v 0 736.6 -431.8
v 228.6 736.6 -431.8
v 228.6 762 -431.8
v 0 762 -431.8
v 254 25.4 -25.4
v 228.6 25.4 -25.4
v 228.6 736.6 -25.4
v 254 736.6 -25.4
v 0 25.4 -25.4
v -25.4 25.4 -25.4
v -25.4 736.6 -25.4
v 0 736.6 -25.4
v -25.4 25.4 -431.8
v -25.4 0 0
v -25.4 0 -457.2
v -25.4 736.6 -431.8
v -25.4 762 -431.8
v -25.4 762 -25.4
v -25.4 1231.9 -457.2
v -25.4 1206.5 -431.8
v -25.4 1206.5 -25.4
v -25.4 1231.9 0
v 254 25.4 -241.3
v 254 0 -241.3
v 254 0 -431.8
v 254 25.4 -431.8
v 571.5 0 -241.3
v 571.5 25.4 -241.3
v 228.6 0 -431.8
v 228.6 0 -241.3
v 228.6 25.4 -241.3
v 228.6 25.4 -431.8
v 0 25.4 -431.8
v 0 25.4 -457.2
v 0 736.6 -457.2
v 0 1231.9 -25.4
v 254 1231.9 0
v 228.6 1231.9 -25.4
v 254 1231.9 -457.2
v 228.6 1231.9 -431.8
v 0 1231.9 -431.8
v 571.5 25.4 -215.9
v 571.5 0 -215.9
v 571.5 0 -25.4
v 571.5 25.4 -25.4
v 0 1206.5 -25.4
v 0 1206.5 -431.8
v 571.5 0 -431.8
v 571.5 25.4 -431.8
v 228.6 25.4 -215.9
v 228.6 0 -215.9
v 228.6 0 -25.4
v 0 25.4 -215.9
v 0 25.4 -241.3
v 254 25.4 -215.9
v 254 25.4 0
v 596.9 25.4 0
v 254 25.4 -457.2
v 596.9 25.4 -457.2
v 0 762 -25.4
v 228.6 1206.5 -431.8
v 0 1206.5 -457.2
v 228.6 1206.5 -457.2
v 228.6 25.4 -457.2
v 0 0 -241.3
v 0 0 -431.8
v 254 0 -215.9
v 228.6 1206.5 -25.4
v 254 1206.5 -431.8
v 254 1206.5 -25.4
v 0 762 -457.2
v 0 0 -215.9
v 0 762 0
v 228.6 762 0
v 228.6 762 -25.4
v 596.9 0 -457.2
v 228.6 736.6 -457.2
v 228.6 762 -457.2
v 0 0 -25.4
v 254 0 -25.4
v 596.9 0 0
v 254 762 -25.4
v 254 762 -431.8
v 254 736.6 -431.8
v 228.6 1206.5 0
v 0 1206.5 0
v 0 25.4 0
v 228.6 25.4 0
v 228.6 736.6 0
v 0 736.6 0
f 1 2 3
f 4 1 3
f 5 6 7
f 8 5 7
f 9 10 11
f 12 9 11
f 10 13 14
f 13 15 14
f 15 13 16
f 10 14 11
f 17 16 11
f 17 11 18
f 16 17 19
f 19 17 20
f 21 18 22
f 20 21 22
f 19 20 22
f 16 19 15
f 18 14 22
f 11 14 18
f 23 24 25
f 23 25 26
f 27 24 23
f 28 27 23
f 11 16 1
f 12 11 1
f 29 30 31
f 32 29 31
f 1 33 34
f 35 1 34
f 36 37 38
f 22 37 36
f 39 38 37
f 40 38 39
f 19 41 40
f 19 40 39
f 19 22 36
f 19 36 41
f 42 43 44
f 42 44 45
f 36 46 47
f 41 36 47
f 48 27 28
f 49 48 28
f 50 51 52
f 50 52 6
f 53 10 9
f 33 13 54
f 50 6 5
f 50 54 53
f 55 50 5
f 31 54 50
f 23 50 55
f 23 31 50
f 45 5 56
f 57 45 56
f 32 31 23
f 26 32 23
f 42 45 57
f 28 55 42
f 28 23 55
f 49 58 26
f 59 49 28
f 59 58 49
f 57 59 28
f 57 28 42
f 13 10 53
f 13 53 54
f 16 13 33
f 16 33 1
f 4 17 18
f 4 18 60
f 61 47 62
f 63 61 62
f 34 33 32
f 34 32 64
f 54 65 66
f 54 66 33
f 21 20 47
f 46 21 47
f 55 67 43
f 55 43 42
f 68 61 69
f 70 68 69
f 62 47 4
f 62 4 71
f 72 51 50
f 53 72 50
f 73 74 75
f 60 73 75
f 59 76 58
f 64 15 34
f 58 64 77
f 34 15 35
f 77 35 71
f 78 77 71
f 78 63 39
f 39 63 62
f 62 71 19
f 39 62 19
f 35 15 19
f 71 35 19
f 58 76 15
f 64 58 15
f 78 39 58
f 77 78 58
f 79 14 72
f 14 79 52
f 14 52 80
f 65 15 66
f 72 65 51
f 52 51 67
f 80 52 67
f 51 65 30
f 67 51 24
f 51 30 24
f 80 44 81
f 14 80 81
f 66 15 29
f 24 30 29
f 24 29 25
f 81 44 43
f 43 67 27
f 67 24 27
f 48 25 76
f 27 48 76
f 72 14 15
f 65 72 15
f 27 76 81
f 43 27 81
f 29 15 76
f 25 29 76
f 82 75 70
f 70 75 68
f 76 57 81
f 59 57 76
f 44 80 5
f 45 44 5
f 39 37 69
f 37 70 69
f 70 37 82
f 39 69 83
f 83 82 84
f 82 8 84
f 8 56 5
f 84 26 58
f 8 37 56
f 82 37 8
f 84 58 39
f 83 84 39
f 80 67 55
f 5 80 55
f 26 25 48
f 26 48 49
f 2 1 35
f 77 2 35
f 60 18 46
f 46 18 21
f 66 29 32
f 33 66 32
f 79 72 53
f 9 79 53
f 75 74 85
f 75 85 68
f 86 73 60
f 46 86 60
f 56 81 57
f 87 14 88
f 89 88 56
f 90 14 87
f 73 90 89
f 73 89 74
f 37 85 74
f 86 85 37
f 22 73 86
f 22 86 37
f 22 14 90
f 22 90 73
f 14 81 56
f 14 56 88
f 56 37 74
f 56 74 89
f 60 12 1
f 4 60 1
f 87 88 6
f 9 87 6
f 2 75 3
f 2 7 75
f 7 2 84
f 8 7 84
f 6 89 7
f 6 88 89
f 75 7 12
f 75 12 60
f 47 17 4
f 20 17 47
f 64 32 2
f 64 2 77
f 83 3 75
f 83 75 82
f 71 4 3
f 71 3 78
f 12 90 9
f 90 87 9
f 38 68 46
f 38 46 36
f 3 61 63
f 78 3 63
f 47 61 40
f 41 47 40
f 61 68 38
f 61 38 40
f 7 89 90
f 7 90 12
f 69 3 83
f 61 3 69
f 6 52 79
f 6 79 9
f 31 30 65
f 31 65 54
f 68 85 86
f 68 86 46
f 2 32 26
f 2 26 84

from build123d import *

# Parameters (mm, degrees)
SKETCH1_W             = 25.4
SKETCH1_H             = 25.4
BOSS_EXTRUDE1_DEPTH   = 1231.9
BOSS_EXTRUDE1_2_DEPTH = 1231.9
BOSS_EXTRUDE1_3_DEPTH = 1231.9
BOSS_EXTRUDE1_4_DEPTH = 1231.9
SKETCH2_W             = 25.4
SKETCH2_H             = 25.4
BOSS_EXTRUDE2_DEPTH   = 596.9
SKETCH3_W             = 25.4
SKETCH3_H             = 25.4
BOSS_EXTRUDE3_DEPTH   = 406.4
SKETCH4_W             = 25.4
SKETCH4_H             = 25.4
BOSS_EXTRUDE4_DEPTH   = 406.4
BOSS_EXTRUDE5_REACH   = 1445.225
SKETCH5_W             = 25.4
SKETCH5_H             = 25.4


with BuildPart() as part:
    # Sketch1 → Boss-Extrude1 (new body)
    with BuildSketch(Plane(origin=(0, 0, 0), x_dir=(1, 0, 0), z_dir=(0, 1, 0))):
        with Locations((-12.7, 12.7)):
            Rectangle(SKETCH1_W, SKETCH1_H)
    extrude(amount=BOSS_EXTRUDE1_DEPTH)



with BuildPart() as body_2:
    # Sketch1 → Boss-Extrude1 2 (new body)
    with BuildSketch(Plane(origin=(0, 0, 0), x_dir=(1, 0, 0), z_dir=(0, 1, 0))):
        with Locations((-12.7, 444.5)):
            Rectangle(SKETCH1_W, SKETCH1_H)
    extrude(amount=BOSS_EXTRUDE1_2_DEPTH)


with BuildPart() as body_3:
    # Sketch1 → Boss-Extrude1 3 (new body)
    with BuildSketch(Plane(origin=(0, 0, 0), x_dir=(1, 0, 0), z_dir=(0, 1, 0))):
        with Locations((241.3, 12.7)):
            Rectangle(SKETCH1_W, SKETCH1_H)
    extrude(amount=BOSS_EXTRUDE1_3_DEPTH)


with BuildPart() as body_4:
    # Sketch1 → Boss-Extrude1 4 (new body)
    with BuildSketch(Plane(origin=(0, 0, 0), x_dir=(1, 0, 0), z_dir=(0, 1, 0))):
        with Locations((241.3, 444.5)):
            Rectangle(SKETCH1_W, SKETCH1_H)
    extrude(amount=BOSS_EXTRUDE1_4_DEPTH)


with BuildPart() as part_1:
    add(part.part)

    add(body_2.part)  # Boss-Extrude2 merges body 2

    add(body_3.part)  # Boss-Extrude2 merges body 3

    add(body_4.part)  # Boss-Extrude2 merges body 4
    # Sketch2 → Boss-Extrude2 (add)
    with BuildSketch(Plane(origin=(0, 0, 0), x_dir=(0, 0, -1), z_dir=(1, 0, 0))):
        with Locations((12.7, 12.7)):
            Rectangle(SKETCH2_W, SKETCH2_H)
        with Locations((444.5, 12.7)):
            Rectangle(SKETCH2_W, SKETCH2_H)
        with Locations((228.6, 12.7)):
            Rectangle(SKETCH2_W, SKETCH2_H)
    extrude(amount=BOSS_EXTRUDE2_DEPTH)

    # Sketch3 → Boss-Extrude3 (add)
    with BuildSketch(Plane(origin=(0, 0, -25.4), x_dir=(-1, 0, 0), z_dir=(0, 0, -1))):
        with Locations((12.7, 12.7)):
            Rectangle(SKETCH3_W, SKETCH3_H)
        with Locations((-584.2, 12.7)):
            Rectangle(SKETCH3_W, SKETCH3_H)
    extrude(amount=BOSS_EXTRUDE3_DEPTH)

    # Sketch4 → Boss-Extrude4 (add)
    with BuildSketch(Plane.XY.offset(-431.8)):
        with Locations((241.3, 12.7)):
            Rectangle(SKETCH4_W, SKETCH4_H)
        with Locations((241.3, 1219.2)):
            Rectangle(SKETCH4_W, SKETCH4_H)
        with Locations((-12.7, 1219.2)):
            Rectangle(SKETCH4_W, SKETCH4_H)
        with Locations((241.3, 749.3)):
            Rectangle(SKETCH4_W, SKETCH4_H)
        with Locations((-12.7, 749.3)):
            Rectangle(SKETCH4_W, SKETCH4_H)
    extrude(amount=BOSS_EXTRUDE4_DEPTH)

    # Sketch5 → Boss-Extrude5 (add, up to next)
    with BuildSketch(Plane(origin=(0, 0, 0), x_dir=(0, 0, -1), z_dir=(1, 0, 0)), mode=Mode.PRIVATE) as boss_extrude5_sk1:
        with Locations((12.7, 1219.2)):
            Rectangle(SKETCH5_W, SKETCH5_H)
    boss_extrude5_tool1 = extrude(boss_extrude5_sk1.sketch, amount=BOSS_EXTRUDE5_REACH, mode=Mode.PRIVATE) - part_1.part
    # Sketch5 → Boss-Extrude5 (add, up to next)
    with BuildSketch(Plane(origin=(0, 0, 0), x_dir=(0, 0, -1), z_dir=(1, 0, 0)), mode=Mode.PRIVATE) as boss_extrude5_sk2:
        with Locations((444.5, 1219.2)):
            Rectangle(SKETCH5_W, SKETCH5_H)
    boss_extrude5_tool2 = extrude(boss_extrude5_sk2.sketch, amount=BOSS_EXTRUDE5_REACH, mode=Mode.PRIVATE) - part_1.part
    # Sketch5 → Boss-Extrude5 (add, up to next)
    with BuildSketch(Plane(origin=(0, 0, 0), x_dir=(0, 0, -1), z_dir=(1, 0, 0)), mode=Mode.PRIVATE) as boss_extrude5_sk3:
        with Locations((444.5, 749.3)):
            Rectangle(SKETCH5_W, SKETCH5_H)
    boss_extrude5_tool3 = extrude(boss_extrude5_sk3.sketch, amount=BOSS_EXTRUDE5_REACH, mode=Mode.PRIVATE) - part_1.part
    # Sketch5 → Boss-Extrude5 (add, up to next)
    with BuildSketch(Plane(origin=(0, 0, 0), x_dir=(0, 0, -1), z_dir=(1, 0, 0)), mode=Mode.PRIVATE) as boss_extrude5_sk4:
        with Locations((12.7, 749.3)):
            Rectangle(SKETCH5_W, SKETCH5_H)
    boss_extrude5_tool4 = extrude(boss_extrude5_sk4.sketch, amount=BOSS_EXTRUDE5_REACH, mode=Mode.PRIVATE) - part_1.part
    add(boss_extrude5_tool1.solids().sort_by_distance((0, 1219.2, -12.7))[0])
    add(boss_extrude5_tool2.solids().sort_by_distance((0, 1219.2, -444.5))[0])
    add(boss_extrude5_tool3.solids().sort_by_distance((0, 749.3, -444.5))[0])
    add(boss_extrude5_tool4.solids().sort_by_distance((0, 749.3, -12.7))[0])


solid = part_1.part
